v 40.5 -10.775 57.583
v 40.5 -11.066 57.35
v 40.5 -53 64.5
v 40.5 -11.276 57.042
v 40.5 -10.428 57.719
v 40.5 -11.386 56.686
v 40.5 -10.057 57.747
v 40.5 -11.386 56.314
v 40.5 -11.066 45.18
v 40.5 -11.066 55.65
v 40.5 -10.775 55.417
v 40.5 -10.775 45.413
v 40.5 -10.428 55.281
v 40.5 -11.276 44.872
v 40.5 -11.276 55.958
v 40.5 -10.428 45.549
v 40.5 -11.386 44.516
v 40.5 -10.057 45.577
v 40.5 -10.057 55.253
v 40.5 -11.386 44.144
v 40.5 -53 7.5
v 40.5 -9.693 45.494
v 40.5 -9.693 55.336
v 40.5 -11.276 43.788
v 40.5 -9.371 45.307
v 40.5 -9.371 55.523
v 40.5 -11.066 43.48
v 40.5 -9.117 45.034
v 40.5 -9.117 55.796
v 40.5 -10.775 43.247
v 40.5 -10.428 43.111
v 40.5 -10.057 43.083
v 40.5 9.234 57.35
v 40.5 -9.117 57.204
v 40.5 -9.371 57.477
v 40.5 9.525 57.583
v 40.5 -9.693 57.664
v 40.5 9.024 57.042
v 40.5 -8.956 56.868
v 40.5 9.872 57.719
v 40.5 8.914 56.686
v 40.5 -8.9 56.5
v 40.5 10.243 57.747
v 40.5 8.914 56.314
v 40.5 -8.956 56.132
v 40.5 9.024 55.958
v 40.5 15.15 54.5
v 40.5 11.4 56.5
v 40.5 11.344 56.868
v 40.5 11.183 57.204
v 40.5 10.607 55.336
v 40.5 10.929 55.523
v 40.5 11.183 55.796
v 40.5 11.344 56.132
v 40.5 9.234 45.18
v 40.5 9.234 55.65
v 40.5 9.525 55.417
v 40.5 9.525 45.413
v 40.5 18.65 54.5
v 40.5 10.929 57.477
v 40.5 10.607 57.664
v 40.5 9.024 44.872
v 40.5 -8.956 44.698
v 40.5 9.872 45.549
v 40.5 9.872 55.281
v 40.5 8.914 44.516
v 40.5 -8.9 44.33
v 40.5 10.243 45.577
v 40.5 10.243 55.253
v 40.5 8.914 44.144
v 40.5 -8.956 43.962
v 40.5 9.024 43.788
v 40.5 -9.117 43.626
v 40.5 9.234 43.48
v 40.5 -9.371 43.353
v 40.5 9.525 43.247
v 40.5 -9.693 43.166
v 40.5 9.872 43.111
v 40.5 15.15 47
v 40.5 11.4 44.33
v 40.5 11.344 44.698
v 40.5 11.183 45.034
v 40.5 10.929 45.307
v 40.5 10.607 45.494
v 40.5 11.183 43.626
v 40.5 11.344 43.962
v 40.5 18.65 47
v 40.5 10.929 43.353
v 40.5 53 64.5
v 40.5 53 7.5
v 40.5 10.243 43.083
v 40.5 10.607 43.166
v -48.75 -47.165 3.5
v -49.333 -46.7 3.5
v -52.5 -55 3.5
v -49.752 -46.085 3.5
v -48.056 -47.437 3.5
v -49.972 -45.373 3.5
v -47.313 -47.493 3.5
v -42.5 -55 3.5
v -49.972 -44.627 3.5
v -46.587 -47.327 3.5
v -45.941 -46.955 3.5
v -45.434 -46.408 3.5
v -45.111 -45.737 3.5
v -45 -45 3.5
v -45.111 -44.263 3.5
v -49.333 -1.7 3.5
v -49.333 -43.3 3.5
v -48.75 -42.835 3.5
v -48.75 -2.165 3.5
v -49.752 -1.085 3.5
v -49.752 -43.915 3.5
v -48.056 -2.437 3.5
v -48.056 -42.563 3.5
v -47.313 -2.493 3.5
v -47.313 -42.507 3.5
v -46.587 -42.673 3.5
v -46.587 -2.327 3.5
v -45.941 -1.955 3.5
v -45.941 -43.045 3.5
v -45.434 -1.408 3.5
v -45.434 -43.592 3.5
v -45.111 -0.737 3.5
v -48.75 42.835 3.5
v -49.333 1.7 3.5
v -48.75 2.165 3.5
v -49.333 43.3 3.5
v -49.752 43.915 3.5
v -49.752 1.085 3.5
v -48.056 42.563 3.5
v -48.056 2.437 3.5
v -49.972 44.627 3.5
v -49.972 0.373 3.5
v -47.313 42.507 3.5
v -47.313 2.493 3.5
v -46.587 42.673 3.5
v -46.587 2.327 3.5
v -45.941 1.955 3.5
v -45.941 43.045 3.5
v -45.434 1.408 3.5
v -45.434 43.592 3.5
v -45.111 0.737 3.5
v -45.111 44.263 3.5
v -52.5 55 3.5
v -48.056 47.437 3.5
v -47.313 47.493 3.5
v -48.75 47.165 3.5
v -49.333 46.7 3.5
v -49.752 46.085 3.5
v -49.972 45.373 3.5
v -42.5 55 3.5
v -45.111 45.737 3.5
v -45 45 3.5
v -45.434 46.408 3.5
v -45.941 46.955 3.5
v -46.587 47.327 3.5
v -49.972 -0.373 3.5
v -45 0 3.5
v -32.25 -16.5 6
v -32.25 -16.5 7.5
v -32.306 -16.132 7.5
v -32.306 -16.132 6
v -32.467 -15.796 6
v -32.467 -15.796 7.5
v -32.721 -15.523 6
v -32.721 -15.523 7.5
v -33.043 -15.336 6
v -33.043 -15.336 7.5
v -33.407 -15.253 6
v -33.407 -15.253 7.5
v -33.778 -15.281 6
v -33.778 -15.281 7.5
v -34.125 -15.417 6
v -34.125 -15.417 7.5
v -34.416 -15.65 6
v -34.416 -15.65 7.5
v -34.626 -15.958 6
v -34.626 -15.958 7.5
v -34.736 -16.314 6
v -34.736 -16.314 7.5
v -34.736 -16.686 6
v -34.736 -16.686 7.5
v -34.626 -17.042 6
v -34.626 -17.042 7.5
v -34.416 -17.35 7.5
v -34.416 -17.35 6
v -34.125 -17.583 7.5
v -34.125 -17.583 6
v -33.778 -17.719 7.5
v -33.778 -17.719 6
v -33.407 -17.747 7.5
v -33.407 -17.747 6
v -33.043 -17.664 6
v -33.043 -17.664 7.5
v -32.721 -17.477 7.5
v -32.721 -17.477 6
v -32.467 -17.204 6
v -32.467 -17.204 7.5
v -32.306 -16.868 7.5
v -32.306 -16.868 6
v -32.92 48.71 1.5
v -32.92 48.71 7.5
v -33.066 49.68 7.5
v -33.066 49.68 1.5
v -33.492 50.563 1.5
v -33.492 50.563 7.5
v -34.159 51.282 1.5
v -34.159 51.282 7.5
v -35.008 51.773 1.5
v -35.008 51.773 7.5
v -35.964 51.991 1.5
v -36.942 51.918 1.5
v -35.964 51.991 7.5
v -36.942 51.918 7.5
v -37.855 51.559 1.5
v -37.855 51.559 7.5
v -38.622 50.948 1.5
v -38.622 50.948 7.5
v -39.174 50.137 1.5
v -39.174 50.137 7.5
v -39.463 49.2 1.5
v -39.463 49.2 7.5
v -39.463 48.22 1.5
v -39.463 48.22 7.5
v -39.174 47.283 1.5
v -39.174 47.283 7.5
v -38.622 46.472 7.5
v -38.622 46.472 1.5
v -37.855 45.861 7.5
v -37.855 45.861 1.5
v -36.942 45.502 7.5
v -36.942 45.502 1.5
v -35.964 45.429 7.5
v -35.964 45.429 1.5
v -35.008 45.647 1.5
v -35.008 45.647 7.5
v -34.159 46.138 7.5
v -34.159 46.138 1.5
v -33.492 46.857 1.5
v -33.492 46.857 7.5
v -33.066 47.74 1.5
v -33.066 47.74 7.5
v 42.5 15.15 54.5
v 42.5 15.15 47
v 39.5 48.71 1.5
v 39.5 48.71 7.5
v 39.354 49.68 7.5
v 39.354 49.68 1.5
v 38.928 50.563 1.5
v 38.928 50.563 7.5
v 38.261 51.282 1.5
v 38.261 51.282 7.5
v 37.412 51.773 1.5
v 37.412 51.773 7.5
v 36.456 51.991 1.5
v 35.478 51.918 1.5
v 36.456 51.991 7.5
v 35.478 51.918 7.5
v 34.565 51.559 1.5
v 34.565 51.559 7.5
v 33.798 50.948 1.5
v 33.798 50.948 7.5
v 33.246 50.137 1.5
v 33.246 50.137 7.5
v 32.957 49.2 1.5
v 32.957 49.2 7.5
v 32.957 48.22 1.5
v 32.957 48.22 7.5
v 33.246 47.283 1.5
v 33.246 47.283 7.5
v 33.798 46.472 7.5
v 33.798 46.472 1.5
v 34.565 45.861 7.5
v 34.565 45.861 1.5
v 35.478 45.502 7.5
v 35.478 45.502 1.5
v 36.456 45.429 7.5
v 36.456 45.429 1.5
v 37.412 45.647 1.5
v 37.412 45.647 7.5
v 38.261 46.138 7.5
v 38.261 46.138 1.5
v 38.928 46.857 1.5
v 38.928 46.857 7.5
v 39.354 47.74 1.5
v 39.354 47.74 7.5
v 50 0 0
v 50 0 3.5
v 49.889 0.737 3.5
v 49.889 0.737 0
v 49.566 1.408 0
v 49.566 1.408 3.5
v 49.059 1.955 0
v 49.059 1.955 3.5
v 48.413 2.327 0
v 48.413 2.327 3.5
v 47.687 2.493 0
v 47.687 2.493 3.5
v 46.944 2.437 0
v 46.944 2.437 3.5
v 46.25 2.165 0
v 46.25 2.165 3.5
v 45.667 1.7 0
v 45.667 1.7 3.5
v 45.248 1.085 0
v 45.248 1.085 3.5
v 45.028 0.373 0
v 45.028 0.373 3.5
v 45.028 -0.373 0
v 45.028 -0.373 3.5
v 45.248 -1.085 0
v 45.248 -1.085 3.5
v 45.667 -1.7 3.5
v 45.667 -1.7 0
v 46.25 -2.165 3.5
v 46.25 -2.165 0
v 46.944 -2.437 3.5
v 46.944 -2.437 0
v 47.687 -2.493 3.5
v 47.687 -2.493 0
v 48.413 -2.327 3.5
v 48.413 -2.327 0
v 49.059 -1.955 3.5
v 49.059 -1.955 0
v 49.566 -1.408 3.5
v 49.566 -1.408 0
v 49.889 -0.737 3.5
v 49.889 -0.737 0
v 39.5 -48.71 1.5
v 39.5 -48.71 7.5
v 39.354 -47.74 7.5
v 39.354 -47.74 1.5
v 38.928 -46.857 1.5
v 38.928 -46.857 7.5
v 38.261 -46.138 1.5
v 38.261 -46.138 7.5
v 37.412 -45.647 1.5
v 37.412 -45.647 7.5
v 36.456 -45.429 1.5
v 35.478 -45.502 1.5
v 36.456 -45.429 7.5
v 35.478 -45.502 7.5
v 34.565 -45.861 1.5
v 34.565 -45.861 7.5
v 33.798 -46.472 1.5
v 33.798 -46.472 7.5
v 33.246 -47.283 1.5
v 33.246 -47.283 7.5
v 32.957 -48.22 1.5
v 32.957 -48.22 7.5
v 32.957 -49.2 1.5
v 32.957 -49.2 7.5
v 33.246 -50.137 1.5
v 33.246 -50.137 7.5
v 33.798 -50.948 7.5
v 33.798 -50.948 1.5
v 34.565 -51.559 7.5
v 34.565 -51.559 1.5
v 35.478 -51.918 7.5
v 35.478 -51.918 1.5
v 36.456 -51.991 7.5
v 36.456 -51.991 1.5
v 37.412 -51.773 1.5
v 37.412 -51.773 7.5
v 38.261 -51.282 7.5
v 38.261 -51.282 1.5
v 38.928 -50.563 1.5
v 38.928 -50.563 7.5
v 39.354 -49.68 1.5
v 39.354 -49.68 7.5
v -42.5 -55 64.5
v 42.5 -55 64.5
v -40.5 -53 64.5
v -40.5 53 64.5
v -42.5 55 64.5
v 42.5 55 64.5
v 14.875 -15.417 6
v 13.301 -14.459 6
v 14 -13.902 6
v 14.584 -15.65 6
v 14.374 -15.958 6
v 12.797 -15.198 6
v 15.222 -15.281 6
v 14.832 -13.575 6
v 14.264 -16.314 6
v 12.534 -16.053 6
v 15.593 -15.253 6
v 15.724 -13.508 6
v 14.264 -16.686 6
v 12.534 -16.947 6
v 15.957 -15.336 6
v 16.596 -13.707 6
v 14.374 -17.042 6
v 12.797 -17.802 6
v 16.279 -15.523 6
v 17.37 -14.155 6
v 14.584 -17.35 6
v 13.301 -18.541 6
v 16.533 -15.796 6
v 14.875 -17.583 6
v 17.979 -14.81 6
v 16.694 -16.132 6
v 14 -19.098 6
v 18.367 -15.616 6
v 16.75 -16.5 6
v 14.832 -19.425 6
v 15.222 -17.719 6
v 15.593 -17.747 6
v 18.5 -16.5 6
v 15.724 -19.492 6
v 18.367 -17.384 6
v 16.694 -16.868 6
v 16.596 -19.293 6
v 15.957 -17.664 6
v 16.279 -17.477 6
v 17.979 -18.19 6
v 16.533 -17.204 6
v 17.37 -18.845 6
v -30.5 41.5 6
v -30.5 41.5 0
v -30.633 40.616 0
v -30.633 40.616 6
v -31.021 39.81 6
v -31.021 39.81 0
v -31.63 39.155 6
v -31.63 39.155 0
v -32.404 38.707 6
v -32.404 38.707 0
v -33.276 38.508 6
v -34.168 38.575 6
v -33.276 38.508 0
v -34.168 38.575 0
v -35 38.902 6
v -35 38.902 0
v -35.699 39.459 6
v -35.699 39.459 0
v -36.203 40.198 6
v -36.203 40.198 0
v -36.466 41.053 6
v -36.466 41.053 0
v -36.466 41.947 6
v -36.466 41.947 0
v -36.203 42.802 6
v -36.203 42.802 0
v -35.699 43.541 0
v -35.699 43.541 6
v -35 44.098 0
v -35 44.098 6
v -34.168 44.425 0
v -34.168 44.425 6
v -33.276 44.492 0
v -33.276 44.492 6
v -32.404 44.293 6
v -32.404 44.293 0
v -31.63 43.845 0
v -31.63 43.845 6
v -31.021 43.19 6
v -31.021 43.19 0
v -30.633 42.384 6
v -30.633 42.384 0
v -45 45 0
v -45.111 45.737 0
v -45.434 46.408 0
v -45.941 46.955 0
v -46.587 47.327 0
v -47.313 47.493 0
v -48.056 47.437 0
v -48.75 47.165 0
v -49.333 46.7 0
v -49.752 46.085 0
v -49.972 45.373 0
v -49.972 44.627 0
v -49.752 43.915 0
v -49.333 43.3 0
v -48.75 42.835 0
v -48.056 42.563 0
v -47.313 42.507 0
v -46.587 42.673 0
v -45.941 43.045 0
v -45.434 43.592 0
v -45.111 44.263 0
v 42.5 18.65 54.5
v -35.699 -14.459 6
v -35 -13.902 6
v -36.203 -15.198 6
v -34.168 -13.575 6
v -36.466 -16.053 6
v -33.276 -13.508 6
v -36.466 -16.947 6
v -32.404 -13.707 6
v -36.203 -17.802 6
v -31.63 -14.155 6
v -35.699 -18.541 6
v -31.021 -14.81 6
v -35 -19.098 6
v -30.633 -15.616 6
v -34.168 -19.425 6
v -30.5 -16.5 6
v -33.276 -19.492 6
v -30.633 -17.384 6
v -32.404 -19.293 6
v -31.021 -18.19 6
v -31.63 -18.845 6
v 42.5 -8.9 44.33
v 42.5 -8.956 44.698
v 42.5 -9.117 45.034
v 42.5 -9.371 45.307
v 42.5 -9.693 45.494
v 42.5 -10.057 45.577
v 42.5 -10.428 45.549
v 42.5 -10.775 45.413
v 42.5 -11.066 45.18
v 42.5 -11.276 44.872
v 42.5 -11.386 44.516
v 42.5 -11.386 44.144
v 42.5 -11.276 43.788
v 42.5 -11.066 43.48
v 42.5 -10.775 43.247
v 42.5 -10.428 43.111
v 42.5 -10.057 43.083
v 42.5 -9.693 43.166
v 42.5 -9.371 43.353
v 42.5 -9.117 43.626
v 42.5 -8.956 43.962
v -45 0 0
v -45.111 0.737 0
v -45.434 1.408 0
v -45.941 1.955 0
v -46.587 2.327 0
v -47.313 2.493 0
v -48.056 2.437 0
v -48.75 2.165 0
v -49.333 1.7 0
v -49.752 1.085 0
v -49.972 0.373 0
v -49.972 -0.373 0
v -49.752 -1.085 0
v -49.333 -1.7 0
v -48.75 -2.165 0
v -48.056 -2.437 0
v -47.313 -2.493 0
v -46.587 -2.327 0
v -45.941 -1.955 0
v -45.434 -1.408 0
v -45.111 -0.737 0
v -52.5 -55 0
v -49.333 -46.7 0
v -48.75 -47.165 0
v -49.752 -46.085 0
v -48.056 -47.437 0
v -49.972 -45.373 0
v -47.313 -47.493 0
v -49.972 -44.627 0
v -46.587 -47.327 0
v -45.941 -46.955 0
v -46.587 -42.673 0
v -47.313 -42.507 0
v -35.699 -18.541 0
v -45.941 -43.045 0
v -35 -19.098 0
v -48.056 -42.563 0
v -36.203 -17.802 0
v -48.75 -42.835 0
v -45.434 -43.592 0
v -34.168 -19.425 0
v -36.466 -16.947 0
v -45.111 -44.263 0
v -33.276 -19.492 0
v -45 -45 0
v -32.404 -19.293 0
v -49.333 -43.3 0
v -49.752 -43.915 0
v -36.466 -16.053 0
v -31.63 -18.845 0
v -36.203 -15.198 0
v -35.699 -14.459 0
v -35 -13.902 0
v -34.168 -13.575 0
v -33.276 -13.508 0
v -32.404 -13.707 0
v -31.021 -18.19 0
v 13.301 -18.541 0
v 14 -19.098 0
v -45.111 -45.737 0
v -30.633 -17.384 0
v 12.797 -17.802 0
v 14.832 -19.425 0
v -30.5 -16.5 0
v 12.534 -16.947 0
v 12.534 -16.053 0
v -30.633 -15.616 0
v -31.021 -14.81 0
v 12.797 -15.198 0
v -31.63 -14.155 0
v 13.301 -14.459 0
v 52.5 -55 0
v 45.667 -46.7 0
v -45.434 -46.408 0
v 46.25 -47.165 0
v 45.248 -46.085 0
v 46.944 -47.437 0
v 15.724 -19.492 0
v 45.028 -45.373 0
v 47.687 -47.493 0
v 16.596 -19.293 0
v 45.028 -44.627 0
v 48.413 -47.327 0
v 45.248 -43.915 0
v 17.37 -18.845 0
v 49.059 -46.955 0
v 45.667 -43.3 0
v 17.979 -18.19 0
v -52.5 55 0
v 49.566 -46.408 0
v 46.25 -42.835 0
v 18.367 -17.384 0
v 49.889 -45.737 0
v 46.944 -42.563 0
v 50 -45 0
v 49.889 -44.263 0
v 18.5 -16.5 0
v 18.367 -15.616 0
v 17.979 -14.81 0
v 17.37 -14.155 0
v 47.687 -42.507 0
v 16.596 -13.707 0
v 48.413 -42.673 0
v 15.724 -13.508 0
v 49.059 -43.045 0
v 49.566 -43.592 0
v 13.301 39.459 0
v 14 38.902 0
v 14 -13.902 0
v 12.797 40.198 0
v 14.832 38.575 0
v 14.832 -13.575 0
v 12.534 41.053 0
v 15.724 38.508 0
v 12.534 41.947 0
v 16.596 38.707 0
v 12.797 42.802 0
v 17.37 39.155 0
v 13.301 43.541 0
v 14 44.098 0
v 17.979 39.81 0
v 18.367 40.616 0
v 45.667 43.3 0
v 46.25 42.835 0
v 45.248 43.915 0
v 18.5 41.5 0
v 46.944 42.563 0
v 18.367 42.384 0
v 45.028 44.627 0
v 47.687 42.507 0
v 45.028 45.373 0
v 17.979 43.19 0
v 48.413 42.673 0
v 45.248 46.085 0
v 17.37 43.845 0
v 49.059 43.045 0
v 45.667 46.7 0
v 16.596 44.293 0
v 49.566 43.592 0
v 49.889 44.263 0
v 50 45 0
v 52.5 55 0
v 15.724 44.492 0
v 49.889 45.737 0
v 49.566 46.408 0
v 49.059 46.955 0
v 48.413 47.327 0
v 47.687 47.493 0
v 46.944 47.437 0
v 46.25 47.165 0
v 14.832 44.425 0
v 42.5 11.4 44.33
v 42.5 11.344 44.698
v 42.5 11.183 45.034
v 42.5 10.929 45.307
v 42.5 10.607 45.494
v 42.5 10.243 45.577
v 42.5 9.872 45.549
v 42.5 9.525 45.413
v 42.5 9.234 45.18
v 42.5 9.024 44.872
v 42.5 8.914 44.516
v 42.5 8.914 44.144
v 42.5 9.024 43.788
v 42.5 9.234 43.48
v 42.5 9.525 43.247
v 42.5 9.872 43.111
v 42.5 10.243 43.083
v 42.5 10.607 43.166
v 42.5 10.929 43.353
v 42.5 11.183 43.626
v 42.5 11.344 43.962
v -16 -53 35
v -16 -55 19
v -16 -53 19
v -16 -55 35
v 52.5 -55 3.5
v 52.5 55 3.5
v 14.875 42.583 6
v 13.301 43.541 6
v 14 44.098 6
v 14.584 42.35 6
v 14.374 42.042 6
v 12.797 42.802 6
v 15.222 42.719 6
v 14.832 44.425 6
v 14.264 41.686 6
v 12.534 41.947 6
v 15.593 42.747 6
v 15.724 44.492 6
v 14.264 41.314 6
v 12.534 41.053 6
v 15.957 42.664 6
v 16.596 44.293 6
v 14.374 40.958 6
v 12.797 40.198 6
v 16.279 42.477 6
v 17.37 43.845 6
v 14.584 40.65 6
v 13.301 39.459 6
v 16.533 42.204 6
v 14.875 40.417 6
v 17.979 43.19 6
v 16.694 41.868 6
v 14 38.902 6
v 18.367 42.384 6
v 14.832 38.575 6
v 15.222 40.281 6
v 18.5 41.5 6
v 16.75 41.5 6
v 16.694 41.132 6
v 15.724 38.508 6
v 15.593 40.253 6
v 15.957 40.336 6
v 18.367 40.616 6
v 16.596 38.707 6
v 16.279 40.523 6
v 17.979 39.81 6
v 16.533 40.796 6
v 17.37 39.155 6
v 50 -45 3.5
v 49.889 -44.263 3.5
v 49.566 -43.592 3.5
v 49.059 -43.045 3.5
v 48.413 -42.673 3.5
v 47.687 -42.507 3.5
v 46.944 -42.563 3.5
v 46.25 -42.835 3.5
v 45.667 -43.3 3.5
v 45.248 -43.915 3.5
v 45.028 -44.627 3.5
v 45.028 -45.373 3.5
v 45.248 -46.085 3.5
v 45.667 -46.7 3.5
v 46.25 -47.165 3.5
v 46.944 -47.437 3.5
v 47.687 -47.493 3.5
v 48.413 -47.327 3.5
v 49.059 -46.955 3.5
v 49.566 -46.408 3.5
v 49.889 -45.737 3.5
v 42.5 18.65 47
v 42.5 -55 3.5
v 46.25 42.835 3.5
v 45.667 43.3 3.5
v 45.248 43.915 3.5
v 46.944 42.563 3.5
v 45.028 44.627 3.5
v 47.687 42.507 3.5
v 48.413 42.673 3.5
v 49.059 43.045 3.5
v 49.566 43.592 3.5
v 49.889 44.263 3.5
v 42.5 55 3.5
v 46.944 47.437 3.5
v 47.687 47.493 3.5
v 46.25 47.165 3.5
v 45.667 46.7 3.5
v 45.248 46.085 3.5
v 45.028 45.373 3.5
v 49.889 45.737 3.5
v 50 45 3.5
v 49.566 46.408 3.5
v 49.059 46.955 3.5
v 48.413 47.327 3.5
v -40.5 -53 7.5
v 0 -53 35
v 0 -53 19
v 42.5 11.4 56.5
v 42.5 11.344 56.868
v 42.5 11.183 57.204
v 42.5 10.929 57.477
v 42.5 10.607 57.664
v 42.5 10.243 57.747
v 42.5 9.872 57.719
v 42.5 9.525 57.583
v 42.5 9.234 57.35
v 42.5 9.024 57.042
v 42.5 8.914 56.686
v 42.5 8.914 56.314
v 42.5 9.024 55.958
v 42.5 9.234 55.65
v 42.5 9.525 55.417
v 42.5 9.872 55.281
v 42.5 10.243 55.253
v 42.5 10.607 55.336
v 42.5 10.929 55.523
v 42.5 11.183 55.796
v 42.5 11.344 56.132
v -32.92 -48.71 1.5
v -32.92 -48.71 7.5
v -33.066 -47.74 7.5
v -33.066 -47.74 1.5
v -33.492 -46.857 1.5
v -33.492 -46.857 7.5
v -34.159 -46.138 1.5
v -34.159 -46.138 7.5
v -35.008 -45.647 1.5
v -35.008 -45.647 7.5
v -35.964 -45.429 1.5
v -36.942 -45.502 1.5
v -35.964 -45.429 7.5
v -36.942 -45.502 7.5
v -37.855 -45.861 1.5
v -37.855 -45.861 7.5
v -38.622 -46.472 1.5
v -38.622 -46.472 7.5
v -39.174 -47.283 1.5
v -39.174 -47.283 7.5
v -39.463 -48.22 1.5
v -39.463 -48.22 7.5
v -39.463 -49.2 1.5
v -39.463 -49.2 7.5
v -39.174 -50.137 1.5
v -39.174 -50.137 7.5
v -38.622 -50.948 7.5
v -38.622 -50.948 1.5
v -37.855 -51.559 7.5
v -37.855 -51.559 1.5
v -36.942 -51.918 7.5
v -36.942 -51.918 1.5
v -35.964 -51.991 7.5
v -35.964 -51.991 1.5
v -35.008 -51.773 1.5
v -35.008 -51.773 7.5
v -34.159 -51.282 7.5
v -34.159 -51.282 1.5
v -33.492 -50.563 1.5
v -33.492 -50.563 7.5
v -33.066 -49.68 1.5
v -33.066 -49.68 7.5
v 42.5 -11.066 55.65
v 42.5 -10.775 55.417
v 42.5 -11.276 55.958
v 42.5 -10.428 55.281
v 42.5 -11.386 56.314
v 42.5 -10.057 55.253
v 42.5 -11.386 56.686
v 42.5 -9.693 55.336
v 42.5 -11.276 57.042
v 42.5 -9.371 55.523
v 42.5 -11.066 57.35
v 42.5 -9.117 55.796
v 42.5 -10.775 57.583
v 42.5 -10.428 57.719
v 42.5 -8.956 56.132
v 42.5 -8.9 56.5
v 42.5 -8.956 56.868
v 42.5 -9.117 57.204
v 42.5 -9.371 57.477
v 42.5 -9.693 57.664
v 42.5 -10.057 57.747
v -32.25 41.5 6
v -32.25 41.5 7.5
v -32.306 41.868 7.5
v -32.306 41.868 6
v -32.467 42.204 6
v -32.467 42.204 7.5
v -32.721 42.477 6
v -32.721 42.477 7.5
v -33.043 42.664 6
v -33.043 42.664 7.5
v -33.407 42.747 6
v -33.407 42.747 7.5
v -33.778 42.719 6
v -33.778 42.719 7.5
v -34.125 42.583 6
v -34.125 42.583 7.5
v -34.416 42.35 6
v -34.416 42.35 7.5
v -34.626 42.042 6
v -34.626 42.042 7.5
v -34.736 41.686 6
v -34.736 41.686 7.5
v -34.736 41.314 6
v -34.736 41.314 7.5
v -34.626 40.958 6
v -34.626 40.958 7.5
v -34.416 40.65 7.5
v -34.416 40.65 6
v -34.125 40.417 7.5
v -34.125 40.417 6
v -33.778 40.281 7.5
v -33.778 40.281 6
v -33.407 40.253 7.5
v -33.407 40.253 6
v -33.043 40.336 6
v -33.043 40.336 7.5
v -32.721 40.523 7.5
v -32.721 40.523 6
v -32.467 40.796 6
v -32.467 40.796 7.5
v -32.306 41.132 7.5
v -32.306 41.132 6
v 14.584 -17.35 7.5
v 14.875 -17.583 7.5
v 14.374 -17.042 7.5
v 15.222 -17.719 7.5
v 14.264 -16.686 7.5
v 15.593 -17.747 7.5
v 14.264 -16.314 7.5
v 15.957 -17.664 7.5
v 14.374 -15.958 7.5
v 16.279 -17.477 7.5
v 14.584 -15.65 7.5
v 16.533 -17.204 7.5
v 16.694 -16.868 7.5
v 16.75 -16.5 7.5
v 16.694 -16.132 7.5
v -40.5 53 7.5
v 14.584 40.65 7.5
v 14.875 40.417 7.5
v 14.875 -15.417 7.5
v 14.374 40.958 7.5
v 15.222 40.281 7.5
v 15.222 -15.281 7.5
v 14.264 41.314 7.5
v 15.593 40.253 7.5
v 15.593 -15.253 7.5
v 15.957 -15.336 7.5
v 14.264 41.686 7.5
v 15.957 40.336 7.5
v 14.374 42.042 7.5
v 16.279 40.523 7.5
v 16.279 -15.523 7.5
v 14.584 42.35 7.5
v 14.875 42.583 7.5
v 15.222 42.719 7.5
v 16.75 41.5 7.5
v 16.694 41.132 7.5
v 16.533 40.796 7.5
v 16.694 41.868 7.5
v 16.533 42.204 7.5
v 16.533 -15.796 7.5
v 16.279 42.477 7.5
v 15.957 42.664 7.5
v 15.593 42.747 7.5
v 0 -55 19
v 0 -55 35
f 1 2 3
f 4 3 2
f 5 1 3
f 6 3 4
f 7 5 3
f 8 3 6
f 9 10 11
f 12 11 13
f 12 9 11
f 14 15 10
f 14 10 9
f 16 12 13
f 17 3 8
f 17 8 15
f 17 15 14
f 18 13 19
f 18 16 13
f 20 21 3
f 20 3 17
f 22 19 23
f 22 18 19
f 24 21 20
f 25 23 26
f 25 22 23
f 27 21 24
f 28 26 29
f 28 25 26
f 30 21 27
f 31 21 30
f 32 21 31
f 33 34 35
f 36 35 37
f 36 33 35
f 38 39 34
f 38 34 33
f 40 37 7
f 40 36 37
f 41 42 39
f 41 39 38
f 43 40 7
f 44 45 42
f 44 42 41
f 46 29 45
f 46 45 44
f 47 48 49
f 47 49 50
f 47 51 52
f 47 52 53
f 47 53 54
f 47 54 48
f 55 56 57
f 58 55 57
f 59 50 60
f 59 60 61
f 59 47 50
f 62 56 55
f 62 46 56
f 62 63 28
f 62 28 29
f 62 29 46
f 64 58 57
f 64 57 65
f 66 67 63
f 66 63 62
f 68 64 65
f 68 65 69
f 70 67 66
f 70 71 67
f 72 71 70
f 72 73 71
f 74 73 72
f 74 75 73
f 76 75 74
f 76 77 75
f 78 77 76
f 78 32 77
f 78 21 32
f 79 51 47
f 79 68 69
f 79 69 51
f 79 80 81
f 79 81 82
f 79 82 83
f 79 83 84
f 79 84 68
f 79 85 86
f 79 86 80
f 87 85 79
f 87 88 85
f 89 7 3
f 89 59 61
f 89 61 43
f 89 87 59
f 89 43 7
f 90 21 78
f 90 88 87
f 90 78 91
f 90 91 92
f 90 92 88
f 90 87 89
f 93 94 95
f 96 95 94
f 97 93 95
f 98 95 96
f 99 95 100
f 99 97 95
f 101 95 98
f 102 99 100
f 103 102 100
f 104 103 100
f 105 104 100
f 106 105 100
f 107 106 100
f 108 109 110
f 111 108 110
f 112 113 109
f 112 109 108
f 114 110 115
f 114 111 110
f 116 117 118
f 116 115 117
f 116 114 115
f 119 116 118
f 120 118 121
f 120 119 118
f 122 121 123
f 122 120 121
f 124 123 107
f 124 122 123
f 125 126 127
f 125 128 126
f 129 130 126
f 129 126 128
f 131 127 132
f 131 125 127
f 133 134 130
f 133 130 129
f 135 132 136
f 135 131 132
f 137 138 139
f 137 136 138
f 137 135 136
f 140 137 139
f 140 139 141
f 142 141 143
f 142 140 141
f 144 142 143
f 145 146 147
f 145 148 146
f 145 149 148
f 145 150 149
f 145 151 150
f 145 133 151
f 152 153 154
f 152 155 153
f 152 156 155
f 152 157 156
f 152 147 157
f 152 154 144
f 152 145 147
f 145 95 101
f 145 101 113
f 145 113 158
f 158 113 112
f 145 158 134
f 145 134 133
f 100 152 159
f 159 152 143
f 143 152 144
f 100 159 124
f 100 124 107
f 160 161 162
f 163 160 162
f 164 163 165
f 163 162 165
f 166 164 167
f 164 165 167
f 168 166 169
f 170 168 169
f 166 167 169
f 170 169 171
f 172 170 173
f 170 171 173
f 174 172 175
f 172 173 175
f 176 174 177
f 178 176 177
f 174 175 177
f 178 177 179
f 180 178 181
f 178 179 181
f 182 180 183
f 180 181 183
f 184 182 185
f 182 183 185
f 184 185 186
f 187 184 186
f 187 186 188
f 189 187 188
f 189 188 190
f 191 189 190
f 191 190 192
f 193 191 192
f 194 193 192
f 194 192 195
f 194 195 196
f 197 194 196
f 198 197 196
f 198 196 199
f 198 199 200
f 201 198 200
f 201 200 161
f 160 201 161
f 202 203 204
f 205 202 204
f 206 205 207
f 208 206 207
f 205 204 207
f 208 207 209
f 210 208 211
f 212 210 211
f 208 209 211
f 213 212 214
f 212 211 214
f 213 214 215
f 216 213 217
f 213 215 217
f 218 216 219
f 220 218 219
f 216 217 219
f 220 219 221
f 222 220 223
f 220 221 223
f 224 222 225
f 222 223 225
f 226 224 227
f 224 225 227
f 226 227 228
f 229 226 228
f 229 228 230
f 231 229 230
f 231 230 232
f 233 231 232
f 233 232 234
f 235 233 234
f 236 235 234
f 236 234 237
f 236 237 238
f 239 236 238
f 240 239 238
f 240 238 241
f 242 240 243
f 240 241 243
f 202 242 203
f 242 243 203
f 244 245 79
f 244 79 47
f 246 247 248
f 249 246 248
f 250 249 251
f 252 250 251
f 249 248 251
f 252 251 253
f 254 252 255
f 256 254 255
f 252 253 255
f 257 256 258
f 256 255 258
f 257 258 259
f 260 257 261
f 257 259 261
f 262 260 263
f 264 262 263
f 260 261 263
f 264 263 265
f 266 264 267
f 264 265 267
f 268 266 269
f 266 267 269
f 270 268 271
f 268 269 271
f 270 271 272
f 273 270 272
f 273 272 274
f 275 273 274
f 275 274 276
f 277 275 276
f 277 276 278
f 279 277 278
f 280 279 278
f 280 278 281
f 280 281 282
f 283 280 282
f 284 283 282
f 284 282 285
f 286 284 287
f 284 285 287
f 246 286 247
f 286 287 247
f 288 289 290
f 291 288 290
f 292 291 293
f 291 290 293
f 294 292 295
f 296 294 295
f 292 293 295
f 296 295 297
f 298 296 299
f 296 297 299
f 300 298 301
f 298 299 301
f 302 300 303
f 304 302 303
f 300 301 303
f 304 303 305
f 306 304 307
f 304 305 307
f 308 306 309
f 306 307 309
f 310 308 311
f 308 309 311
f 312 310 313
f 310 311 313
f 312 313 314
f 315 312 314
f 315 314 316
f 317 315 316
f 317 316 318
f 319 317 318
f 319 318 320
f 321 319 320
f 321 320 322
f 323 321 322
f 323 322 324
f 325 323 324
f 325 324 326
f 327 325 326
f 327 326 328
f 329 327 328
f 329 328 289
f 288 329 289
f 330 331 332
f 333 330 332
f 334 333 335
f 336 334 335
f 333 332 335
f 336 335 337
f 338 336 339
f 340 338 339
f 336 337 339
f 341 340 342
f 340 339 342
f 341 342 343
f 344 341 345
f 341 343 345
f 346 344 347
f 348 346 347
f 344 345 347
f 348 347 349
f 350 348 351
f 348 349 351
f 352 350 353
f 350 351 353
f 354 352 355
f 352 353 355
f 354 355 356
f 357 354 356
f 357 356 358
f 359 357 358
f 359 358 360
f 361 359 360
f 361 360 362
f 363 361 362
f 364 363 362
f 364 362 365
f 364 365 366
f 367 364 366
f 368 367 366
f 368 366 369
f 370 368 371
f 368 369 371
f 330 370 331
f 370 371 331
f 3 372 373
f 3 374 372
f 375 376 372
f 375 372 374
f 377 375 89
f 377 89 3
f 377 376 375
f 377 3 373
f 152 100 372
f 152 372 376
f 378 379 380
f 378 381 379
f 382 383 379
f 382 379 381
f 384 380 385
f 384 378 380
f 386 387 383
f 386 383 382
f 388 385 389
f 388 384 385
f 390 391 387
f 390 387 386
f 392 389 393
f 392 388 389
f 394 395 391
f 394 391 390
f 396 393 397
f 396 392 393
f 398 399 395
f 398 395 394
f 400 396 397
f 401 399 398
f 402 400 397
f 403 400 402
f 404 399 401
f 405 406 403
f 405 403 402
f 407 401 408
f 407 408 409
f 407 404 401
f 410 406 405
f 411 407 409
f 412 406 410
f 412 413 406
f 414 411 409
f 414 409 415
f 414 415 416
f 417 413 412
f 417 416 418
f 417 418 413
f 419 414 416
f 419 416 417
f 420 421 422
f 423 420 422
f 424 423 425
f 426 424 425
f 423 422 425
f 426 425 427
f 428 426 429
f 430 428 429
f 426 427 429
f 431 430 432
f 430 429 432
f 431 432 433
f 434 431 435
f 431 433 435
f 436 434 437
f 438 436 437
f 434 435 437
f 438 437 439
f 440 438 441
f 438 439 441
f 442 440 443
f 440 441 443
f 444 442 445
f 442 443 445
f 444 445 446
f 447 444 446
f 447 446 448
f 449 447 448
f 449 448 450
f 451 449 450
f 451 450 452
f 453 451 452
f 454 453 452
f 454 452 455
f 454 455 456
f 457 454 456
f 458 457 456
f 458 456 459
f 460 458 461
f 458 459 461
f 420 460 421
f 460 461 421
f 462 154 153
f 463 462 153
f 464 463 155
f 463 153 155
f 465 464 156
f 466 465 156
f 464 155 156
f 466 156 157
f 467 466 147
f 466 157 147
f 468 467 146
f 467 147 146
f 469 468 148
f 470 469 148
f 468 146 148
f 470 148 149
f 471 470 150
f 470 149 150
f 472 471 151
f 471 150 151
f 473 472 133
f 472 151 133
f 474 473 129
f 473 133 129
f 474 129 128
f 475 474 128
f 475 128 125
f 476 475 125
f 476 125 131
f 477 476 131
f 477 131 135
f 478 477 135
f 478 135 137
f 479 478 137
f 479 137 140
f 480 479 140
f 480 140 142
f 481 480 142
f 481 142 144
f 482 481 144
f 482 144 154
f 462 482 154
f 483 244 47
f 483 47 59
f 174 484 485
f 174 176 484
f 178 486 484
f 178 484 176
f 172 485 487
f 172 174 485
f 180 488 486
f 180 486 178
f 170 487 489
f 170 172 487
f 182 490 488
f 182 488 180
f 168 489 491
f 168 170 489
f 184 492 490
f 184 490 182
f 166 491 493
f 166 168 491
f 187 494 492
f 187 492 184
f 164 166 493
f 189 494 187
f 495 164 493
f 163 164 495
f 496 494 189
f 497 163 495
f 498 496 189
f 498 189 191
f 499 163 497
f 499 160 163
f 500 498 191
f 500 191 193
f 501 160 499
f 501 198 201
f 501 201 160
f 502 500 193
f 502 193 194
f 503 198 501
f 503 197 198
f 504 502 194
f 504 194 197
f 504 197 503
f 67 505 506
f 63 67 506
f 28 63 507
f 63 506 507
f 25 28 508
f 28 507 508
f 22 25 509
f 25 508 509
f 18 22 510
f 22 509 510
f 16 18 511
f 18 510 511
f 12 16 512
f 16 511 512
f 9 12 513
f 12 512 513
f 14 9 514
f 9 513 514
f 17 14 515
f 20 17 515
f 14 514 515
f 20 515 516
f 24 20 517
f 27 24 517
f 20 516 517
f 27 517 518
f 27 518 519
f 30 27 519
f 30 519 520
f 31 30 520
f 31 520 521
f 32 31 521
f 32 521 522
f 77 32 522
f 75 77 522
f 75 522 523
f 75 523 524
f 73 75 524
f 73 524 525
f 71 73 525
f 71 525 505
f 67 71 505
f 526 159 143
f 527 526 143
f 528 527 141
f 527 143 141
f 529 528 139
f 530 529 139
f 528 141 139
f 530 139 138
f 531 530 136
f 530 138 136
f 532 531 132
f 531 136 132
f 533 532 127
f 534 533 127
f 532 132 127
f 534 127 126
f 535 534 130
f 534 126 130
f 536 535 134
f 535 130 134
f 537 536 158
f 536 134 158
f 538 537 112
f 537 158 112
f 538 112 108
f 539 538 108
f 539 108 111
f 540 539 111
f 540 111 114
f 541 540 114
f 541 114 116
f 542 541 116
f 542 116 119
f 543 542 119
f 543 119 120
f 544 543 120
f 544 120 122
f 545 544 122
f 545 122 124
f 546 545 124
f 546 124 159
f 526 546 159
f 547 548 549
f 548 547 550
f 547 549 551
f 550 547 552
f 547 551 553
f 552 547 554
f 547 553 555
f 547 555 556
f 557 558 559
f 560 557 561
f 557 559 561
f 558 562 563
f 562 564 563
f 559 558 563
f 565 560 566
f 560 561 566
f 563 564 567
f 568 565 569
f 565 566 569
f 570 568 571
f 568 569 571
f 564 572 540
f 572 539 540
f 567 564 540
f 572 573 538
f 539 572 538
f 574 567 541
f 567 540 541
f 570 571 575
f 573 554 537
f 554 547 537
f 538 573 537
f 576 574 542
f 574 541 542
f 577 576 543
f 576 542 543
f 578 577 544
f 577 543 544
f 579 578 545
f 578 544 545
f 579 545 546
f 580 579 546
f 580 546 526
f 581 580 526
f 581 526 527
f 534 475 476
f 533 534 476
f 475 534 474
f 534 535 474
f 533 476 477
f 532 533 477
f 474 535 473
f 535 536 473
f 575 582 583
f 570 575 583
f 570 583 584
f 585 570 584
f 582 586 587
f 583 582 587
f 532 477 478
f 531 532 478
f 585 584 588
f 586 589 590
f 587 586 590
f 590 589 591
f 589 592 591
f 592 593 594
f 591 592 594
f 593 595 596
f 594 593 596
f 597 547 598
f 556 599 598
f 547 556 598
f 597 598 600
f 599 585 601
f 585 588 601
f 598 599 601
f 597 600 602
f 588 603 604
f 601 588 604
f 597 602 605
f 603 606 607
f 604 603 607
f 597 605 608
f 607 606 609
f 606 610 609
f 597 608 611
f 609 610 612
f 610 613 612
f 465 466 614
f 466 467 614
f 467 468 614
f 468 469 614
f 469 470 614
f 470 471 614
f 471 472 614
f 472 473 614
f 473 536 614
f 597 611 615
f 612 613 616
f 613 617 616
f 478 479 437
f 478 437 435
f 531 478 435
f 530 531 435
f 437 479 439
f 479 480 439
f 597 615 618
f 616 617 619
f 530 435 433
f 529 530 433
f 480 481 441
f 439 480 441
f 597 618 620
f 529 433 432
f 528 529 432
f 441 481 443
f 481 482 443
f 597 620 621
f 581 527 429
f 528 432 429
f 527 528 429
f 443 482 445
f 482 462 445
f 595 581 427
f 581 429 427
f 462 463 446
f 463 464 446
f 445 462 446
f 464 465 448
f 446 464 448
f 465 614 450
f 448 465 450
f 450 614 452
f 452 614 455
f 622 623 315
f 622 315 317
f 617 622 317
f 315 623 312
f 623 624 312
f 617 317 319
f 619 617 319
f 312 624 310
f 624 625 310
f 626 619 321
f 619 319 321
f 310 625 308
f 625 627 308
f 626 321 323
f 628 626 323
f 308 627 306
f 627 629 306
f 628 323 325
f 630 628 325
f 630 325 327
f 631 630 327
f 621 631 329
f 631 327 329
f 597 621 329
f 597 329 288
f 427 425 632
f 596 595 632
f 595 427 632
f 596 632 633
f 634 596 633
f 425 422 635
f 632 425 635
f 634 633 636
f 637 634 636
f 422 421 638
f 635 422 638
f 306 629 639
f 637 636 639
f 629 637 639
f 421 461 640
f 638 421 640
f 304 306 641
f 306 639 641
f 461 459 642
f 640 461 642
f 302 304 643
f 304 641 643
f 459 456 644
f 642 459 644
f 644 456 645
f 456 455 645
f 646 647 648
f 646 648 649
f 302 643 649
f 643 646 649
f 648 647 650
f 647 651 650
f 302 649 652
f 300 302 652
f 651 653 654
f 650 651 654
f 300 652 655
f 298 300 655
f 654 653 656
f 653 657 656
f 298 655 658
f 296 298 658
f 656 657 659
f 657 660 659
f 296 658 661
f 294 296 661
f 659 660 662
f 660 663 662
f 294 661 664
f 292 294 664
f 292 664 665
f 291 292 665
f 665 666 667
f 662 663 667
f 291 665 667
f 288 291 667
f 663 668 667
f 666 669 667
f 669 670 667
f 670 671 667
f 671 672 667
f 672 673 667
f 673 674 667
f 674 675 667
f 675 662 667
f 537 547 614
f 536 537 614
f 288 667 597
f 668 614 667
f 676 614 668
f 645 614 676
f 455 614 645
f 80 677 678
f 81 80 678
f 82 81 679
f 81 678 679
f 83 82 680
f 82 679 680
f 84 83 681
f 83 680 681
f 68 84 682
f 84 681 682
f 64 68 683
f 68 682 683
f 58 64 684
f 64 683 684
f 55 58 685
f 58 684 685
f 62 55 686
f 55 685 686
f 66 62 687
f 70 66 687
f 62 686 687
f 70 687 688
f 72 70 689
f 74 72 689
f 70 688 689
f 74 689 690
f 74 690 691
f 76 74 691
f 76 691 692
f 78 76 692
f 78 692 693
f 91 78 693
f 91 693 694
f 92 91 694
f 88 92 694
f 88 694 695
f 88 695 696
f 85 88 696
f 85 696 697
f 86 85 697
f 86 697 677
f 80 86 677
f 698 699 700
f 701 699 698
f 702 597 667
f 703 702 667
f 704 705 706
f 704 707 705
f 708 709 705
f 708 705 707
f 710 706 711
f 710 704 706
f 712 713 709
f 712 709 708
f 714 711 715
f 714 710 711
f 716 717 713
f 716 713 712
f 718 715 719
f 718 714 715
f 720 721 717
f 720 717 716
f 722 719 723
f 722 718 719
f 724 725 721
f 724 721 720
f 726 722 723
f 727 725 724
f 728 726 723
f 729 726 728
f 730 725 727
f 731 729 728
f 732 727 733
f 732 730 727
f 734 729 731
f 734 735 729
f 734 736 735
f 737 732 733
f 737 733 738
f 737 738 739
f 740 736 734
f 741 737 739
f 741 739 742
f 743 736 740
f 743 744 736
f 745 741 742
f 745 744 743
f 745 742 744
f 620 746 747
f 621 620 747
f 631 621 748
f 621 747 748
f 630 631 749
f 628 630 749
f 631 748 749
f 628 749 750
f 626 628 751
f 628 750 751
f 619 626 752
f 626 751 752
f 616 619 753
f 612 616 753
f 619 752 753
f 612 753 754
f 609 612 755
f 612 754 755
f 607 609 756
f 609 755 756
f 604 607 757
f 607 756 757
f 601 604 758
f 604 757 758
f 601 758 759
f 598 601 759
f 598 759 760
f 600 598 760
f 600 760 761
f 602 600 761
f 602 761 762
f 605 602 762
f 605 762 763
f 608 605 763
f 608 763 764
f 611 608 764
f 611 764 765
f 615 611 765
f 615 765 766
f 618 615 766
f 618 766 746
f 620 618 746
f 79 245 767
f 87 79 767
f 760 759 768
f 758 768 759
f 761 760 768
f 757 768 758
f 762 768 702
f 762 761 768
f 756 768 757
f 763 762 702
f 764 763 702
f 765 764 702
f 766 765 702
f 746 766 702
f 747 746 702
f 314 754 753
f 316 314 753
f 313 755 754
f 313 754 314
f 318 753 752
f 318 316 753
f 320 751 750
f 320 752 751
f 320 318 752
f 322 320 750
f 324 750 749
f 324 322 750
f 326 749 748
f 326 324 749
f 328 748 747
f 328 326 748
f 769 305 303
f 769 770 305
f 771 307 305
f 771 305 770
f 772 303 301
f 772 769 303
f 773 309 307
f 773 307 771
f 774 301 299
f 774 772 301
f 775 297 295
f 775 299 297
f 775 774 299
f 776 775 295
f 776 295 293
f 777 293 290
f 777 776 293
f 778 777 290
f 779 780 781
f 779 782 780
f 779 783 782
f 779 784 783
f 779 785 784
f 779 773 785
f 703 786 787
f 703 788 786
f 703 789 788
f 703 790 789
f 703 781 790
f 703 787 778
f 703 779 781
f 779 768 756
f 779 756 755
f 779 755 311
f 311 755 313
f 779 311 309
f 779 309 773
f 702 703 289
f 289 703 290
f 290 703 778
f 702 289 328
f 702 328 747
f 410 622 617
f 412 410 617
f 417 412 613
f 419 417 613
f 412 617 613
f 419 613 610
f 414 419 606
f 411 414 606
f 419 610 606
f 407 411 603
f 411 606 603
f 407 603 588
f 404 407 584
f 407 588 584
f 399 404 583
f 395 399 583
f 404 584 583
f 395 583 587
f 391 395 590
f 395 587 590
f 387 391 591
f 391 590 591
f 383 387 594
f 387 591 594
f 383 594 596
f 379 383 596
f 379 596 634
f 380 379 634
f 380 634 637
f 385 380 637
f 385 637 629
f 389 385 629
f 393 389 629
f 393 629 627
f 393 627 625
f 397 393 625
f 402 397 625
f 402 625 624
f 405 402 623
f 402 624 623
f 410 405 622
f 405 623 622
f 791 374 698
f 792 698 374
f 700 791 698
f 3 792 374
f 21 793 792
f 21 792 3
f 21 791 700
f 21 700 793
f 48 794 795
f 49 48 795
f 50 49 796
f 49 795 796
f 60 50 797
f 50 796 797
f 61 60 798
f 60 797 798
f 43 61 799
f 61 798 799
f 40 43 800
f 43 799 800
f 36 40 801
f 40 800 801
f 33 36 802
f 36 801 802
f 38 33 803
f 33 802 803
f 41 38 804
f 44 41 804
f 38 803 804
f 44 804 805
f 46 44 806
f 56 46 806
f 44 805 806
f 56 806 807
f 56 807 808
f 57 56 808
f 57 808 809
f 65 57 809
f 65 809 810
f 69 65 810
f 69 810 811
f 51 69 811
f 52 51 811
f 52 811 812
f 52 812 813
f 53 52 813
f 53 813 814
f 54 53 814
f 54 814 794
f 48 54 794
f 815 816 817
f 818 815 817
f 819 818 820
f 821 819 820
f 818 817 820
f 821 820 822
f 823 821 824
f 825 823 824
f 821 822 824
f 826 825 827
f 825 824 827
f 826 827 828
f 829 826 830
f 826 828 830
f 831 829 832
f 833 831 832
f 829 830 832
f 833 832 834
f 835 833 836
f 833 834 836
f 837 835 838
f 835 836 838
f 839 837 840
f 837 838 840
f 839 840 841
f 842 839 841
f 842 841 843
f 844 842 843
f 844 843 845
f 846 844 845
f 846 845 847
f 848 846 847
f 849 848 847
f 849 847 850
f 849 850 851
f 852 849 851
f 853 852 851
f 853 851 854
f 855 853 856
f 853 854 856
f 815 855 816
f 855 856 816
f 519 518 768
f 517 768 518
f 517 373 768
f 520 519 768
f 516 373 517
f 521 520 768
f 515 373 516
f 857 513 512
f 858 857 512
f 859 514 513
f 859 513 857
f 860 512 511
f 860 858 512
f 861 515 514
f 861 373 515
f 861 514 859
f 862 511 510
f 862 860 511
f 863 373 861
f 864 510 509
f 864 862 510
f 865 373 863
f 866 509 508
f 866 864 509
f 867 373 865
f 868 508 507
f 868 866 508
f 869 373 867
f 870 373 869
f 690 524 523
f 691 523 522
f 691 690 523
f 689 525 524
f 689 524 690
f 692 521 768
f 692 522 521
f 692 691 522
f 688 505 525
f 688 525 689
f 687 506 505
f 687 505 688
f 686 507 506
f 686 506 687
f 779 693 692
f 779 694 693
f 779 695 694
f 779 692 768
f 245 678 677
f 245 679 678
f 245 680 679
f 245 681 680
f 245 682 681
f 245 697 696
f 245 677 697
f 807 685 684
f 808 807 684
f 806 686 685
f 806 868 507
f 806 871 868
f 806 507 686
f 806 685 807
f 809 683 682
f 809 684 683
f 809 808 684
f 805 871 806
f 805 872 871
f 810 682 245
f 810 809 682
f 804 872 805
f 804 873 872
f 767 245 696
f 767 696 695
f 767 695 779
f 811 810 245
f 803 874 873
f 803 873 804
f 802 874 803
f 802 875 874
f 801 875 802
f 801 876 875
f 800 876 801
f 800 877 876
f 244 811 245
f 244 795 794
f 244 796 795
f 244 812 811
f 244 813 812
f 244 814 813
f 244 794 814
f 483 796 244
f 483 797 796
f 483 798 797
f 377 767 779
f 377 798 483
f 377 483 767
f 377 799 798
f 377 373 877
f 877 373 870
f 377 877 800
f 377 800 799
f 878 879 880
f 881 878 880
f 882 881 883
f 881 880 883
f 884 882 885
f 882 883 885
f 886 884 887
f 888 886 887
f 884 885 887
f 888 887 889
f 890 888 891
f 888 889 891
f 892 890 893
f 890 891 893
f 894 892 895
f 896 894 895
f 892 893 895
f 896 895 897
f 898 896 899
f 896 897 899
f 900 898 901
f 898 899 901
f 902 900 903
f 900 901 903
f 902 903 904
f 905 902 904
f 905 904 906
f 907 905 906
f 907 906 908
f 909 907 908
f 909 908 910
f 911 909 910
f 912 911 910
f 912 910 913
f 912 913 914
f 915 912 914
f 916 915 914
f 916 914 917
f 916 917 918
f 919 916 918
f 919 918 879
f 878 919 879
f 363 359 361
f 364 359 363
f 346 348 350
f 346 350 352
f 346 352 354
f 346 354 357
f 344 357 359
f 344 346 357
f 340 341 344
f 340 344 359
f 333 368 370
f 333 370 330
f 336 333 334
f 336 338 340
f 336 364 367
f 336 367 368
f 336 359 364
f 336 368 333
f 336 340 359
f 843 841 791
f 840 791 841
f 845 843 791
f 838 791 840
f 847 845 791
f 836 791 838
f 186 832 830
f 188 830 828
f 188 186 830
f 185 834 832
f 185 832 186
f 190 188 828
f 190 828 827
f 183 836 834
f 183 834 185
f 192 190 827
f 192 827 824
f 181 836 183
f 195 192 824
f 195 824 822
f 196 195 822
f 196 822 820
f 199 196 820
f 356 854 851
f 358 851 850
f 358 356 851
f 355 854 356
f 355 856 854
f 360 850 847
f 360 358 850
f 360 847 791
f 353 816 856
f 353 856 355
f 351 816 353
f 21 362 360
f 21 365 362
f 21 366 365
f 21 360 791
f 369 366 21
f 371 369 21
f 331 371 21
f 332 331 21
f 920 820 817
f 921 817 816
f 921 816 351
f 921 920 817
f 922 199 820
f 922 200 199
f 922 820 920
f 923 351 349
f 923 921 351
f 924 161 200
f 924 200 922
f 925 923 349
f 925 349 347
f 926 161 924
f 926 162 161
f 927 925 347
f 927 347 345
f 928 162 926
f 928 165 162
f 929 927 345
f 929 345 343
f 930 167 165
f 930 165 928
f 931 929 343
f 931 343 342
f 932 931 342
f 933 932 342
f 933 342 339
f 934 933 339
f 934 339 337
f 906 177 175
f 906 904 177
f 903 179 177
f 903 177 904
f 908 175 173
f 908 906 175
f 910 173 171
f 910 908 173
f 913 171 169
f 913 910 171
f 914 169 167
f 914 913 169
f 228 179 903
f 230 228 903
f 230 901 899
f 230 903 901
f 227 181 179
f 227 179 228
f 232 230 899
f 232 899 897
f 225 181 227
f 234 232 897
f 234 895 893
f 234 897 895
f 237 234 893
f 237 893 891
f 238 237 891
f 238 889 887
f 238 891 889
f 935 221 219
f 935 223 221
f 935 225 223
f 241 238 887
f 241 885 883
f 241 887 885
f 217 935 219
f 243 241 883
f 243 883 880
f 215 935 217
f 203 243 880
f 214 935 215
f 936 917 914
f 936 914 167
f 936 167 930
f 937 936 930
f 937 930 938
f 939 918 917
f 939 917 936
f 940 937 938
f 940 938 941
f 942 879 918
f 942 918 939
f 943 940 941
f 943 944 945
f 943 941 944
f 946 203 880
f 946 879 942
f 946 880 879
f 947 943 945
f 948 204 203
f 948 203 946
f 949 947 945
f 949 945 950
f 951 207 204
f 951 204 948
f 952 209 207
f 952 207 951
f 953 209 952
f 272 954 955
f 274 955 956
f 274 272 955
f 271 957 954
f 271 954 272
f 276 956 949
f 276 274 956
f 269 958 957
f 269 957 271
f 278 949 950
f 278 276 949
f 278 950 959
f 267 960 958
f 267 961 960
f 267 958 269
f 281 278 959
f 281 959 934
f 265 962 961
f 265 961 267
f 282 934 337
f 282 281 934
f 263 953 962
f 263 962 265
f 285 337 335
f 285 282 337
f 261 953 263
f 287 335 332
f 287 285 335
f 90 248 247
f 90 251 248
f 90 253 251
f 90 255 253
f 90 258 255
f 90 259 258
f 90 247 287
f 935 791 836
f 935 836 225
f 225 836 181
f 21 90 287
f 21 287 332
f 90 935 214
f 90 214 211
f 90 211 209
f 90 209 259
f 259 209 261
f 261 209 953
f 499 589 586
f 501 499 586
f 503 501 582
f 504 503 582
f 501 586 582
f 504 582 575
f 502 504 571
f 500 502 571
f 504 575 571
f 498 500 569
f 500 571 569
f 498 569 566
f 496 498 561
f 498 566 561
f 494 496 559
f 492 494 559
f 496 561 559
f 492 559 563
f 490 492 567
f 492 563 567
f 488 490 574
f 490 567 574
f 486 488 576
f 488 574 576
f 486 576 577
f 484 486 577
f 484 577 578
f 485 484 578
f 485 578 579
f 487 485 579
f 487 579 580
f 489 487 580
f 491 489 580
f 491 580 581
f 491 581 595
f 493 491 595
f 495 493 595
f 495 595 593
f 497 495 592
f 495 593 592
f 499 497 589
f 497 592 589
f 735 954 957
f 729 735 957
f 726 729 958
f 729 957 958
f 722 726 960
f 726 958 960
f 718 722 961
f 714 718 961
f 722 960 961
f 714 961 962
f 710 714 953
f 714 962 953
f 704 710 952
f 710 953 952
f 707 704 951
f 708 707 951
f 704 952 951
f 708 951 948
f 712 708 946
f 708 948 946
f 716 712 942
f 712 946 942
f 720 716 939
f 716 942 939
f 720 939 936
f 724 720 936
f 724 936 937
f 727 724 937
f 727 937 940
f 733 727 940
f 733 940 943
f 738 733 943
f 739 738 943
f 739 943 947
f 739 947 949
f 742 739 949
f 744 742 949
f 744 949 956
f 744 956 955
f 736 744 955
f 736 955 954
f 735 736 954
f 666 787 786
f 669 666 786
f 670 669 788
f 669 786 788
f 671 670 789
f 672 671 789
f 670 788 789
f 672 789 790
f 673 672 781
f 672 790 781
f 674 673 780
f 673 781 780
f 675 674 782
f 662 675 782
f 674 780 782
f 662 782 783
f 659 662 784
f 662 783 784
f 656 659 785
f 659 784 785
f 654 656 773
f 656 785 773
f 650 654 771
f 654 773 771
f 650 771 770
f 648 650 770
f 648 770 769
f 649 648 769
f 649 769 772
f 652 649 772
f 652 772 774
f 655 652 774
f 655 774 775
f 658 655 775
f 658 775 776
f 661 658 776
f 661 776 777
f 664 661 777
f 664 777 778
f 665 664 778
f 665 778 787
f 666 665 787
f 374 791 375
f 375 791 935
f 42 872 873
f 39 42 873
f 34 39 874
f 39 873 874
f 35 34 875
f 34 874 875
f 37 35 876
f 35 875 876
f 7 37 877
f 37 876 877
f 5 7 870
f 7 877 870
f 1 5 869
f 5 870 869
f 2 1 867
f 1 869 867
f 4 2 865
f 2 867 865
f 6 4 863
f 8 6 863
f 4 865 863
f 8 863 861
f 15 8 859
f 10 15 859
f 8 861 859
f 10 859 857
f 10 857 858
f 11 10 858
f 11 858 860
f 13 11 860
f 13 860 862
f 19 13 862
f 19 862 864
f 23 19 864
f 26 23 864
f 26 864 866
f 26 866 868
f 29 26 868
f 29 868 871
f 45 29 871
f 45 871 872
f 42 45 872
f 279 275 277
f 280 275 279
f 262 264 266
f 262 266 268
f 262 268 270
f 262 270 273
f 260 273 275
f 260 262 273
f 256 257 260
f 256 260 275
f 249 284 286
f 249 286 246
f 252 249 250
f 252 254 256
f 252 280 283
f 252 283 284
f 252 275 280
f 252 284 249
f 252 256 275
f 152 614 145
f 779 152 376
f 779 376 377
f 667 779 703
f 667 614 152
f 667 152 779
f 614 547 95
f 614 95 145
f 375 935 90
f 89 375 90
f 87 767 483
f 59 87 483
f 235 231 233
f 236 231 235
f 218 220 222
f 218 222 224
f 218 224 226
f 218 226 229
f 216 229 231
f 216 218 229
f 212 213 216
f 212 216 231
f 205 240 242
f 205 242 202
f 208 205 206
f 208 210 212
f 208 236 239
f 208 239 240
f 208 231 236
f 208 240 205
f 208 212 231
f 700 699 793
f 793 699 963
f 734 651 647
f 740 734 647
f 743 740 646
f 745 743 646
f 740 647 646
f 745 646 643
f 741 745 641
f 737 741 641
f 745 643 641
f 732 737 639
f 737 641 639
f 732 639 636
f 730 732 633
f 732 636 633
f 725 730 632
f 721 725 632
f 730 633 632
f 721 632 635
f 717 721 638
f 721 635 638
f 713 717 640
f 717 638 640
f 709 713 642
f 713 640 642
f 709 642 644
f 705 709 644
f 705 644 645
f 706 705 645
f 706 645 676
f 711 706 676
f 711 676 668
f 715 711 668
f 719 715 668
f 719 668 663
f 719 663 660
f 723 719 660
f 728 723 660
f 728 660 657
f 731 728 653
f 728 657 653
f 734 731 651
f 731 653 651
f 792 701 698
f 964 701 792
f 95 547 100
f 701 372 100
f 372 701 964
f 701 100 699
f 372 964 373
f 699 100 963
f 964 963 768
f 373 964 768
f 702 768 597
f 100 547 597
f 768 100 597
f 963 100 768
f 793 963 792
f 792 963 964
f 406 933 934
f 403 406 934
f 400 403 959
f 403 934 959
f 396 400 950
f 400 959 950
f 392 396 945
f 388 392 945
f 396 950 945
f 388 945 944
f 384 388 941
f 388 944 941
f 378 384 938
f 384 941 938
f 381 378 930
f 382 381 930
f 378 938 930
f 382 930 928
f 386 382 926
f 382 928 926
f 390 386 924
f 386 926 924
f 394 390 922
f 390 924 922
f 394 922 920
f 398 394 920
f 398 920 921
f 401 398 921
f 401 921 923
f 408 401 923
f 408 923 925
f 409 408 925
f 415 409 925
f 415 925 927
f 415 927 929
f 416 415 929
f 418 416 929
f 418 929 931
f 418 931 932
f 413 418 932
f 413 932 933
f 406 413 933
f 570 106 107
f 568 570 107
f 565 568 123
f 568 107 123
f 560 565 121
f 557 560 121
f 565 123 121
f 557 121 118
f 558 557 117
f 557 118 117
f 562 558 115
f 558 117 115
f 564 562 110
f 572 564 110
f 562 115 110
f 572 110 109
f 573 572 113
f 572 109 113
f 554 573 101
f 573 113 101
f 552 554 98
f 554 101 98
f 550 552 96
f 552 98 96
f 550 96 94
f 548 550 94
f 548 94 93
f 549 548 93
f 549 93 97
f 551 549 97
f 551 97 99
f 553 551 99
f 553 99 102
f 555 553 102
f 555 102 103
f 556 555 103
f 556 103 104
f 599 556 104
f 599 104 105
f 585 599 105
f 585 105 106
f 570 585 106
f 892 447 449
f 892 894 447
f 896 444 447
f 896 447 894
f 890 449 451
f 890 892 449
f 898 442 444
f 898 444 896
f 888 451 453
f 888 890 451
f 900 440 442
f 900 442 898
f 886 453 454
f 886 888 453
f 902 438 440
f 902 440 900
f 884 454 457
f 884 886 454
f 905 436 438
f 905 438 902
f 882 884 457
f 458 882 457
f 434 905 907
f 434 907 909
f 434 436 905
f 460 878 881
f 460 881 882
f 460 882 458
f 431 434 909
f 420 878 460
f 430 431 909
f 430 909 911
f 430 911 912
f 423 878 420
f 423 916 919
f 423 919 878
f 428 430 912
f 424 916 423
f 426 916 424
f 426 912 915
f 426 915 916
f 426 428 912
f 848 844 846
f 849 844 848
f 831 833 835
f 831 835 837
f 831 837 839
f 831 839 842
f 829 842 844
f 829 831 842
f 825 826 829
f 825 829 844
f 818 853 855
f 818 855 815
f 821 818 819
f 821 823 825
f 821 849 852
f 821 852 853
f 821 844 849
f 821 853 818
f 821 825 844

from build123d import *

# Parameters (mm, degrees)
SKETCH_W        = 105
SKETCH_H        = 110
PAD_DEPTH       = 7.5
SKETCH001_R     = 1.25
POCKET_DEPTH    = 8
SKETCH002_R     = 3
POCKET001_DEPTH = 6
SKETCH003_W     = 85
SKETCH003_H     = 110
SKETCH003_W_2   = 81
SKETCH003_H_2   = 106
PAD001_DEPTH    = 57
SKETCH004_R     = 3.29
POCKET002_DEPTH = 6
SKETCH005_W     = 10
SKETCH005_H     = 110
POCKET003_DEPTH = 4
SKETCH006_W     = 10
SKETCH006_H     = 110
POCKET004_DEPTH = 4
SKETCH007_R     = 2.5
POCKET005_DEPTH = 5
SKETCH008_W     = 16
SKETCH008_H     = 16
POCKET006_DEPTH = 5
SKETCH009_R     = 1.25
SKETCH009_W     = 3.5
SKETCH009_H     = 7.5
POCKET007_DEPTH = 5


with BuildPart() as part:
    # Sketch → Pad (new body)
    with BuildSketch(Plane.XY):
        Rectangle(SKETCH_W, SKETCH_H)
    extrude(amount=PAD_DEPTH)

    # Sketch001 (on Face6 of Pad) → Pocket (cut)
    with BuildSketch(Plane.XY.offset(7.5)):
        with Locations((-33.5, 41.5)):
            Circle(SKETCH001_R)
        with Locations((15.5, 41.5)):
            Circle(SKETCH001_R)
        with Locations((-33.5, -16.5)):
            Circle(SKETCH001_R)
        with Locations((15.5, -16.5)):
            Circle(SKETCH001_R)
    extrude(amount=-POCKET_DEPTH, mode=Mode.SUBTRACT)

    # Sketch002 (on Face4 of Pocket) → Pocket001 (cut)
    with BuildSketch(Plane(origin=(0, 0, 0), x_dir=(1, 0, 0), z_dir=(0, 0, -1))):
        with Locations((-33.5, 16.5)):
            Circle(SKETCH002_R)
        with Locations((15.5, 16.5)):
            Circle(SKETCH002_R)
        with Locations((-33.5, -41.5)):
            Circle(SKETCH002_R)
        with Locations((15.5, -41.5)):
            Circle(SKETCH002_R)
    extrude(amount=-POCKET001_DEPTH, mode=Mode.SUBTRACT)

    # Sketch003 (on Face5 of Pocket001) → Pad001 (join)
    with BuildSketch(Plane.XY.offset(7.5)):
        Rectangle(SKETCH003_W, SKETCH003_H)
        Rectangle(SKETCH003_W_2, SKETCH003_H_2, mode=Mode.SUBTRACT)
    extrude(amount=PAD001_DEPTH)

    # Sketch004 (on Face29 of Pad001) → Pocket002 (cut)
    with BuildSketch(Plane.XY.offset(7.5)):
        with Locations((-36.21, 48.71)):
            Circle(SKETCH004_R)
        with Locations((36.21, 48.71)):
            Circle(SKETCH004_R)
        with Locations((-36.21, -48.71)):
            Circle(SKETCH004_R)
        with Locations((36.21, -48.71)):
            Circle(SKETCH004_R)
    extrude(amount=-POCKET002_DEPTH, mode=Mode.SUBTRACT)

    # Sketch005 (on Face5 of Pocket002) → Pocket003 (cut)
    with BuildSketch(Plane.XY.offset(7.5)):
        with Locations((-47.5, 0)):
            Rectangle(SKETCH005_W, SKETCH005_H)
    extrude(amount=-POCKET003_DEPTH, mode=Mode.SUBTRACT)

    # Sketch006 (on Face4 of Pocket003) → Pocket004 (cut)
    with BuildSketch(Plane.XY.offset(7.5)):
        with Locations((47.5, 0)):
            Rectangle(SKETCH006_W, SKETCH006_H)
    extrude(amount=-POCKET004_DEPTH, mode=Mode.SUBTRACT)

    # Sketch007 (on Face8 of Pocket004) → Pocket005 (cut)
    with BuildSketch(Plane.XY.offset(3.5)):
        with Locations((-47.5, 45)):
            Circle(SKETCH007_R)
        with Locations((-47.5, 0)):
            Circle(SKETCH007_R)
        with Locations((-47.5, -45)):
            Circle(SKETCH007_R)
        with Locations((47.5, 45)):
            Circle(SKETCH007_R)
        with Locations((47.5, 0)):
            Circle(SKETCH007_R)
        with Locations((47.5, -45)):
            Circle(SKETCH007_R)
    extrude(amount=-POCKET005_DEPTH, mode=Mode.SUBTRACT)

    # Sketch008 (on Face24 of Pocket005) → Pocket006 (cut)
    with BuildSketch(Plane.XZ.offset(55)):
        with Locations((-8, 27)):
            Rectangle(SKETCH008_W, SKETCH008_H)
    extrude(amount=-POCKET006_DEPTH, mode=Mode.SUBTRACT)

    # Sketch009 (on Face21 of Pocket006) → Pocket007 (cut)
    with BuildSketch(Plane.YZ.offset(42.5)):
        with Locations((-10.15, 56.5)):
            Circle(SKETCH009_R)
        with Locations((10.15, 56.5)):
            Circle(SKETCH009_R)
        with Locations((-10.15, 44.33)):
            Circle(SKETCH009_R)
        with Locations((10.15, 44.33)):
            Circle(SKETCH009_R)
        with Locations((16.9, 50.75)):
            Rectangle(SKETCH009_W, SKETCH009_H)
    extrude(amount=-POCKET007_DEPTH, mode=Mode.SUBTRACT)


solid = part.part
